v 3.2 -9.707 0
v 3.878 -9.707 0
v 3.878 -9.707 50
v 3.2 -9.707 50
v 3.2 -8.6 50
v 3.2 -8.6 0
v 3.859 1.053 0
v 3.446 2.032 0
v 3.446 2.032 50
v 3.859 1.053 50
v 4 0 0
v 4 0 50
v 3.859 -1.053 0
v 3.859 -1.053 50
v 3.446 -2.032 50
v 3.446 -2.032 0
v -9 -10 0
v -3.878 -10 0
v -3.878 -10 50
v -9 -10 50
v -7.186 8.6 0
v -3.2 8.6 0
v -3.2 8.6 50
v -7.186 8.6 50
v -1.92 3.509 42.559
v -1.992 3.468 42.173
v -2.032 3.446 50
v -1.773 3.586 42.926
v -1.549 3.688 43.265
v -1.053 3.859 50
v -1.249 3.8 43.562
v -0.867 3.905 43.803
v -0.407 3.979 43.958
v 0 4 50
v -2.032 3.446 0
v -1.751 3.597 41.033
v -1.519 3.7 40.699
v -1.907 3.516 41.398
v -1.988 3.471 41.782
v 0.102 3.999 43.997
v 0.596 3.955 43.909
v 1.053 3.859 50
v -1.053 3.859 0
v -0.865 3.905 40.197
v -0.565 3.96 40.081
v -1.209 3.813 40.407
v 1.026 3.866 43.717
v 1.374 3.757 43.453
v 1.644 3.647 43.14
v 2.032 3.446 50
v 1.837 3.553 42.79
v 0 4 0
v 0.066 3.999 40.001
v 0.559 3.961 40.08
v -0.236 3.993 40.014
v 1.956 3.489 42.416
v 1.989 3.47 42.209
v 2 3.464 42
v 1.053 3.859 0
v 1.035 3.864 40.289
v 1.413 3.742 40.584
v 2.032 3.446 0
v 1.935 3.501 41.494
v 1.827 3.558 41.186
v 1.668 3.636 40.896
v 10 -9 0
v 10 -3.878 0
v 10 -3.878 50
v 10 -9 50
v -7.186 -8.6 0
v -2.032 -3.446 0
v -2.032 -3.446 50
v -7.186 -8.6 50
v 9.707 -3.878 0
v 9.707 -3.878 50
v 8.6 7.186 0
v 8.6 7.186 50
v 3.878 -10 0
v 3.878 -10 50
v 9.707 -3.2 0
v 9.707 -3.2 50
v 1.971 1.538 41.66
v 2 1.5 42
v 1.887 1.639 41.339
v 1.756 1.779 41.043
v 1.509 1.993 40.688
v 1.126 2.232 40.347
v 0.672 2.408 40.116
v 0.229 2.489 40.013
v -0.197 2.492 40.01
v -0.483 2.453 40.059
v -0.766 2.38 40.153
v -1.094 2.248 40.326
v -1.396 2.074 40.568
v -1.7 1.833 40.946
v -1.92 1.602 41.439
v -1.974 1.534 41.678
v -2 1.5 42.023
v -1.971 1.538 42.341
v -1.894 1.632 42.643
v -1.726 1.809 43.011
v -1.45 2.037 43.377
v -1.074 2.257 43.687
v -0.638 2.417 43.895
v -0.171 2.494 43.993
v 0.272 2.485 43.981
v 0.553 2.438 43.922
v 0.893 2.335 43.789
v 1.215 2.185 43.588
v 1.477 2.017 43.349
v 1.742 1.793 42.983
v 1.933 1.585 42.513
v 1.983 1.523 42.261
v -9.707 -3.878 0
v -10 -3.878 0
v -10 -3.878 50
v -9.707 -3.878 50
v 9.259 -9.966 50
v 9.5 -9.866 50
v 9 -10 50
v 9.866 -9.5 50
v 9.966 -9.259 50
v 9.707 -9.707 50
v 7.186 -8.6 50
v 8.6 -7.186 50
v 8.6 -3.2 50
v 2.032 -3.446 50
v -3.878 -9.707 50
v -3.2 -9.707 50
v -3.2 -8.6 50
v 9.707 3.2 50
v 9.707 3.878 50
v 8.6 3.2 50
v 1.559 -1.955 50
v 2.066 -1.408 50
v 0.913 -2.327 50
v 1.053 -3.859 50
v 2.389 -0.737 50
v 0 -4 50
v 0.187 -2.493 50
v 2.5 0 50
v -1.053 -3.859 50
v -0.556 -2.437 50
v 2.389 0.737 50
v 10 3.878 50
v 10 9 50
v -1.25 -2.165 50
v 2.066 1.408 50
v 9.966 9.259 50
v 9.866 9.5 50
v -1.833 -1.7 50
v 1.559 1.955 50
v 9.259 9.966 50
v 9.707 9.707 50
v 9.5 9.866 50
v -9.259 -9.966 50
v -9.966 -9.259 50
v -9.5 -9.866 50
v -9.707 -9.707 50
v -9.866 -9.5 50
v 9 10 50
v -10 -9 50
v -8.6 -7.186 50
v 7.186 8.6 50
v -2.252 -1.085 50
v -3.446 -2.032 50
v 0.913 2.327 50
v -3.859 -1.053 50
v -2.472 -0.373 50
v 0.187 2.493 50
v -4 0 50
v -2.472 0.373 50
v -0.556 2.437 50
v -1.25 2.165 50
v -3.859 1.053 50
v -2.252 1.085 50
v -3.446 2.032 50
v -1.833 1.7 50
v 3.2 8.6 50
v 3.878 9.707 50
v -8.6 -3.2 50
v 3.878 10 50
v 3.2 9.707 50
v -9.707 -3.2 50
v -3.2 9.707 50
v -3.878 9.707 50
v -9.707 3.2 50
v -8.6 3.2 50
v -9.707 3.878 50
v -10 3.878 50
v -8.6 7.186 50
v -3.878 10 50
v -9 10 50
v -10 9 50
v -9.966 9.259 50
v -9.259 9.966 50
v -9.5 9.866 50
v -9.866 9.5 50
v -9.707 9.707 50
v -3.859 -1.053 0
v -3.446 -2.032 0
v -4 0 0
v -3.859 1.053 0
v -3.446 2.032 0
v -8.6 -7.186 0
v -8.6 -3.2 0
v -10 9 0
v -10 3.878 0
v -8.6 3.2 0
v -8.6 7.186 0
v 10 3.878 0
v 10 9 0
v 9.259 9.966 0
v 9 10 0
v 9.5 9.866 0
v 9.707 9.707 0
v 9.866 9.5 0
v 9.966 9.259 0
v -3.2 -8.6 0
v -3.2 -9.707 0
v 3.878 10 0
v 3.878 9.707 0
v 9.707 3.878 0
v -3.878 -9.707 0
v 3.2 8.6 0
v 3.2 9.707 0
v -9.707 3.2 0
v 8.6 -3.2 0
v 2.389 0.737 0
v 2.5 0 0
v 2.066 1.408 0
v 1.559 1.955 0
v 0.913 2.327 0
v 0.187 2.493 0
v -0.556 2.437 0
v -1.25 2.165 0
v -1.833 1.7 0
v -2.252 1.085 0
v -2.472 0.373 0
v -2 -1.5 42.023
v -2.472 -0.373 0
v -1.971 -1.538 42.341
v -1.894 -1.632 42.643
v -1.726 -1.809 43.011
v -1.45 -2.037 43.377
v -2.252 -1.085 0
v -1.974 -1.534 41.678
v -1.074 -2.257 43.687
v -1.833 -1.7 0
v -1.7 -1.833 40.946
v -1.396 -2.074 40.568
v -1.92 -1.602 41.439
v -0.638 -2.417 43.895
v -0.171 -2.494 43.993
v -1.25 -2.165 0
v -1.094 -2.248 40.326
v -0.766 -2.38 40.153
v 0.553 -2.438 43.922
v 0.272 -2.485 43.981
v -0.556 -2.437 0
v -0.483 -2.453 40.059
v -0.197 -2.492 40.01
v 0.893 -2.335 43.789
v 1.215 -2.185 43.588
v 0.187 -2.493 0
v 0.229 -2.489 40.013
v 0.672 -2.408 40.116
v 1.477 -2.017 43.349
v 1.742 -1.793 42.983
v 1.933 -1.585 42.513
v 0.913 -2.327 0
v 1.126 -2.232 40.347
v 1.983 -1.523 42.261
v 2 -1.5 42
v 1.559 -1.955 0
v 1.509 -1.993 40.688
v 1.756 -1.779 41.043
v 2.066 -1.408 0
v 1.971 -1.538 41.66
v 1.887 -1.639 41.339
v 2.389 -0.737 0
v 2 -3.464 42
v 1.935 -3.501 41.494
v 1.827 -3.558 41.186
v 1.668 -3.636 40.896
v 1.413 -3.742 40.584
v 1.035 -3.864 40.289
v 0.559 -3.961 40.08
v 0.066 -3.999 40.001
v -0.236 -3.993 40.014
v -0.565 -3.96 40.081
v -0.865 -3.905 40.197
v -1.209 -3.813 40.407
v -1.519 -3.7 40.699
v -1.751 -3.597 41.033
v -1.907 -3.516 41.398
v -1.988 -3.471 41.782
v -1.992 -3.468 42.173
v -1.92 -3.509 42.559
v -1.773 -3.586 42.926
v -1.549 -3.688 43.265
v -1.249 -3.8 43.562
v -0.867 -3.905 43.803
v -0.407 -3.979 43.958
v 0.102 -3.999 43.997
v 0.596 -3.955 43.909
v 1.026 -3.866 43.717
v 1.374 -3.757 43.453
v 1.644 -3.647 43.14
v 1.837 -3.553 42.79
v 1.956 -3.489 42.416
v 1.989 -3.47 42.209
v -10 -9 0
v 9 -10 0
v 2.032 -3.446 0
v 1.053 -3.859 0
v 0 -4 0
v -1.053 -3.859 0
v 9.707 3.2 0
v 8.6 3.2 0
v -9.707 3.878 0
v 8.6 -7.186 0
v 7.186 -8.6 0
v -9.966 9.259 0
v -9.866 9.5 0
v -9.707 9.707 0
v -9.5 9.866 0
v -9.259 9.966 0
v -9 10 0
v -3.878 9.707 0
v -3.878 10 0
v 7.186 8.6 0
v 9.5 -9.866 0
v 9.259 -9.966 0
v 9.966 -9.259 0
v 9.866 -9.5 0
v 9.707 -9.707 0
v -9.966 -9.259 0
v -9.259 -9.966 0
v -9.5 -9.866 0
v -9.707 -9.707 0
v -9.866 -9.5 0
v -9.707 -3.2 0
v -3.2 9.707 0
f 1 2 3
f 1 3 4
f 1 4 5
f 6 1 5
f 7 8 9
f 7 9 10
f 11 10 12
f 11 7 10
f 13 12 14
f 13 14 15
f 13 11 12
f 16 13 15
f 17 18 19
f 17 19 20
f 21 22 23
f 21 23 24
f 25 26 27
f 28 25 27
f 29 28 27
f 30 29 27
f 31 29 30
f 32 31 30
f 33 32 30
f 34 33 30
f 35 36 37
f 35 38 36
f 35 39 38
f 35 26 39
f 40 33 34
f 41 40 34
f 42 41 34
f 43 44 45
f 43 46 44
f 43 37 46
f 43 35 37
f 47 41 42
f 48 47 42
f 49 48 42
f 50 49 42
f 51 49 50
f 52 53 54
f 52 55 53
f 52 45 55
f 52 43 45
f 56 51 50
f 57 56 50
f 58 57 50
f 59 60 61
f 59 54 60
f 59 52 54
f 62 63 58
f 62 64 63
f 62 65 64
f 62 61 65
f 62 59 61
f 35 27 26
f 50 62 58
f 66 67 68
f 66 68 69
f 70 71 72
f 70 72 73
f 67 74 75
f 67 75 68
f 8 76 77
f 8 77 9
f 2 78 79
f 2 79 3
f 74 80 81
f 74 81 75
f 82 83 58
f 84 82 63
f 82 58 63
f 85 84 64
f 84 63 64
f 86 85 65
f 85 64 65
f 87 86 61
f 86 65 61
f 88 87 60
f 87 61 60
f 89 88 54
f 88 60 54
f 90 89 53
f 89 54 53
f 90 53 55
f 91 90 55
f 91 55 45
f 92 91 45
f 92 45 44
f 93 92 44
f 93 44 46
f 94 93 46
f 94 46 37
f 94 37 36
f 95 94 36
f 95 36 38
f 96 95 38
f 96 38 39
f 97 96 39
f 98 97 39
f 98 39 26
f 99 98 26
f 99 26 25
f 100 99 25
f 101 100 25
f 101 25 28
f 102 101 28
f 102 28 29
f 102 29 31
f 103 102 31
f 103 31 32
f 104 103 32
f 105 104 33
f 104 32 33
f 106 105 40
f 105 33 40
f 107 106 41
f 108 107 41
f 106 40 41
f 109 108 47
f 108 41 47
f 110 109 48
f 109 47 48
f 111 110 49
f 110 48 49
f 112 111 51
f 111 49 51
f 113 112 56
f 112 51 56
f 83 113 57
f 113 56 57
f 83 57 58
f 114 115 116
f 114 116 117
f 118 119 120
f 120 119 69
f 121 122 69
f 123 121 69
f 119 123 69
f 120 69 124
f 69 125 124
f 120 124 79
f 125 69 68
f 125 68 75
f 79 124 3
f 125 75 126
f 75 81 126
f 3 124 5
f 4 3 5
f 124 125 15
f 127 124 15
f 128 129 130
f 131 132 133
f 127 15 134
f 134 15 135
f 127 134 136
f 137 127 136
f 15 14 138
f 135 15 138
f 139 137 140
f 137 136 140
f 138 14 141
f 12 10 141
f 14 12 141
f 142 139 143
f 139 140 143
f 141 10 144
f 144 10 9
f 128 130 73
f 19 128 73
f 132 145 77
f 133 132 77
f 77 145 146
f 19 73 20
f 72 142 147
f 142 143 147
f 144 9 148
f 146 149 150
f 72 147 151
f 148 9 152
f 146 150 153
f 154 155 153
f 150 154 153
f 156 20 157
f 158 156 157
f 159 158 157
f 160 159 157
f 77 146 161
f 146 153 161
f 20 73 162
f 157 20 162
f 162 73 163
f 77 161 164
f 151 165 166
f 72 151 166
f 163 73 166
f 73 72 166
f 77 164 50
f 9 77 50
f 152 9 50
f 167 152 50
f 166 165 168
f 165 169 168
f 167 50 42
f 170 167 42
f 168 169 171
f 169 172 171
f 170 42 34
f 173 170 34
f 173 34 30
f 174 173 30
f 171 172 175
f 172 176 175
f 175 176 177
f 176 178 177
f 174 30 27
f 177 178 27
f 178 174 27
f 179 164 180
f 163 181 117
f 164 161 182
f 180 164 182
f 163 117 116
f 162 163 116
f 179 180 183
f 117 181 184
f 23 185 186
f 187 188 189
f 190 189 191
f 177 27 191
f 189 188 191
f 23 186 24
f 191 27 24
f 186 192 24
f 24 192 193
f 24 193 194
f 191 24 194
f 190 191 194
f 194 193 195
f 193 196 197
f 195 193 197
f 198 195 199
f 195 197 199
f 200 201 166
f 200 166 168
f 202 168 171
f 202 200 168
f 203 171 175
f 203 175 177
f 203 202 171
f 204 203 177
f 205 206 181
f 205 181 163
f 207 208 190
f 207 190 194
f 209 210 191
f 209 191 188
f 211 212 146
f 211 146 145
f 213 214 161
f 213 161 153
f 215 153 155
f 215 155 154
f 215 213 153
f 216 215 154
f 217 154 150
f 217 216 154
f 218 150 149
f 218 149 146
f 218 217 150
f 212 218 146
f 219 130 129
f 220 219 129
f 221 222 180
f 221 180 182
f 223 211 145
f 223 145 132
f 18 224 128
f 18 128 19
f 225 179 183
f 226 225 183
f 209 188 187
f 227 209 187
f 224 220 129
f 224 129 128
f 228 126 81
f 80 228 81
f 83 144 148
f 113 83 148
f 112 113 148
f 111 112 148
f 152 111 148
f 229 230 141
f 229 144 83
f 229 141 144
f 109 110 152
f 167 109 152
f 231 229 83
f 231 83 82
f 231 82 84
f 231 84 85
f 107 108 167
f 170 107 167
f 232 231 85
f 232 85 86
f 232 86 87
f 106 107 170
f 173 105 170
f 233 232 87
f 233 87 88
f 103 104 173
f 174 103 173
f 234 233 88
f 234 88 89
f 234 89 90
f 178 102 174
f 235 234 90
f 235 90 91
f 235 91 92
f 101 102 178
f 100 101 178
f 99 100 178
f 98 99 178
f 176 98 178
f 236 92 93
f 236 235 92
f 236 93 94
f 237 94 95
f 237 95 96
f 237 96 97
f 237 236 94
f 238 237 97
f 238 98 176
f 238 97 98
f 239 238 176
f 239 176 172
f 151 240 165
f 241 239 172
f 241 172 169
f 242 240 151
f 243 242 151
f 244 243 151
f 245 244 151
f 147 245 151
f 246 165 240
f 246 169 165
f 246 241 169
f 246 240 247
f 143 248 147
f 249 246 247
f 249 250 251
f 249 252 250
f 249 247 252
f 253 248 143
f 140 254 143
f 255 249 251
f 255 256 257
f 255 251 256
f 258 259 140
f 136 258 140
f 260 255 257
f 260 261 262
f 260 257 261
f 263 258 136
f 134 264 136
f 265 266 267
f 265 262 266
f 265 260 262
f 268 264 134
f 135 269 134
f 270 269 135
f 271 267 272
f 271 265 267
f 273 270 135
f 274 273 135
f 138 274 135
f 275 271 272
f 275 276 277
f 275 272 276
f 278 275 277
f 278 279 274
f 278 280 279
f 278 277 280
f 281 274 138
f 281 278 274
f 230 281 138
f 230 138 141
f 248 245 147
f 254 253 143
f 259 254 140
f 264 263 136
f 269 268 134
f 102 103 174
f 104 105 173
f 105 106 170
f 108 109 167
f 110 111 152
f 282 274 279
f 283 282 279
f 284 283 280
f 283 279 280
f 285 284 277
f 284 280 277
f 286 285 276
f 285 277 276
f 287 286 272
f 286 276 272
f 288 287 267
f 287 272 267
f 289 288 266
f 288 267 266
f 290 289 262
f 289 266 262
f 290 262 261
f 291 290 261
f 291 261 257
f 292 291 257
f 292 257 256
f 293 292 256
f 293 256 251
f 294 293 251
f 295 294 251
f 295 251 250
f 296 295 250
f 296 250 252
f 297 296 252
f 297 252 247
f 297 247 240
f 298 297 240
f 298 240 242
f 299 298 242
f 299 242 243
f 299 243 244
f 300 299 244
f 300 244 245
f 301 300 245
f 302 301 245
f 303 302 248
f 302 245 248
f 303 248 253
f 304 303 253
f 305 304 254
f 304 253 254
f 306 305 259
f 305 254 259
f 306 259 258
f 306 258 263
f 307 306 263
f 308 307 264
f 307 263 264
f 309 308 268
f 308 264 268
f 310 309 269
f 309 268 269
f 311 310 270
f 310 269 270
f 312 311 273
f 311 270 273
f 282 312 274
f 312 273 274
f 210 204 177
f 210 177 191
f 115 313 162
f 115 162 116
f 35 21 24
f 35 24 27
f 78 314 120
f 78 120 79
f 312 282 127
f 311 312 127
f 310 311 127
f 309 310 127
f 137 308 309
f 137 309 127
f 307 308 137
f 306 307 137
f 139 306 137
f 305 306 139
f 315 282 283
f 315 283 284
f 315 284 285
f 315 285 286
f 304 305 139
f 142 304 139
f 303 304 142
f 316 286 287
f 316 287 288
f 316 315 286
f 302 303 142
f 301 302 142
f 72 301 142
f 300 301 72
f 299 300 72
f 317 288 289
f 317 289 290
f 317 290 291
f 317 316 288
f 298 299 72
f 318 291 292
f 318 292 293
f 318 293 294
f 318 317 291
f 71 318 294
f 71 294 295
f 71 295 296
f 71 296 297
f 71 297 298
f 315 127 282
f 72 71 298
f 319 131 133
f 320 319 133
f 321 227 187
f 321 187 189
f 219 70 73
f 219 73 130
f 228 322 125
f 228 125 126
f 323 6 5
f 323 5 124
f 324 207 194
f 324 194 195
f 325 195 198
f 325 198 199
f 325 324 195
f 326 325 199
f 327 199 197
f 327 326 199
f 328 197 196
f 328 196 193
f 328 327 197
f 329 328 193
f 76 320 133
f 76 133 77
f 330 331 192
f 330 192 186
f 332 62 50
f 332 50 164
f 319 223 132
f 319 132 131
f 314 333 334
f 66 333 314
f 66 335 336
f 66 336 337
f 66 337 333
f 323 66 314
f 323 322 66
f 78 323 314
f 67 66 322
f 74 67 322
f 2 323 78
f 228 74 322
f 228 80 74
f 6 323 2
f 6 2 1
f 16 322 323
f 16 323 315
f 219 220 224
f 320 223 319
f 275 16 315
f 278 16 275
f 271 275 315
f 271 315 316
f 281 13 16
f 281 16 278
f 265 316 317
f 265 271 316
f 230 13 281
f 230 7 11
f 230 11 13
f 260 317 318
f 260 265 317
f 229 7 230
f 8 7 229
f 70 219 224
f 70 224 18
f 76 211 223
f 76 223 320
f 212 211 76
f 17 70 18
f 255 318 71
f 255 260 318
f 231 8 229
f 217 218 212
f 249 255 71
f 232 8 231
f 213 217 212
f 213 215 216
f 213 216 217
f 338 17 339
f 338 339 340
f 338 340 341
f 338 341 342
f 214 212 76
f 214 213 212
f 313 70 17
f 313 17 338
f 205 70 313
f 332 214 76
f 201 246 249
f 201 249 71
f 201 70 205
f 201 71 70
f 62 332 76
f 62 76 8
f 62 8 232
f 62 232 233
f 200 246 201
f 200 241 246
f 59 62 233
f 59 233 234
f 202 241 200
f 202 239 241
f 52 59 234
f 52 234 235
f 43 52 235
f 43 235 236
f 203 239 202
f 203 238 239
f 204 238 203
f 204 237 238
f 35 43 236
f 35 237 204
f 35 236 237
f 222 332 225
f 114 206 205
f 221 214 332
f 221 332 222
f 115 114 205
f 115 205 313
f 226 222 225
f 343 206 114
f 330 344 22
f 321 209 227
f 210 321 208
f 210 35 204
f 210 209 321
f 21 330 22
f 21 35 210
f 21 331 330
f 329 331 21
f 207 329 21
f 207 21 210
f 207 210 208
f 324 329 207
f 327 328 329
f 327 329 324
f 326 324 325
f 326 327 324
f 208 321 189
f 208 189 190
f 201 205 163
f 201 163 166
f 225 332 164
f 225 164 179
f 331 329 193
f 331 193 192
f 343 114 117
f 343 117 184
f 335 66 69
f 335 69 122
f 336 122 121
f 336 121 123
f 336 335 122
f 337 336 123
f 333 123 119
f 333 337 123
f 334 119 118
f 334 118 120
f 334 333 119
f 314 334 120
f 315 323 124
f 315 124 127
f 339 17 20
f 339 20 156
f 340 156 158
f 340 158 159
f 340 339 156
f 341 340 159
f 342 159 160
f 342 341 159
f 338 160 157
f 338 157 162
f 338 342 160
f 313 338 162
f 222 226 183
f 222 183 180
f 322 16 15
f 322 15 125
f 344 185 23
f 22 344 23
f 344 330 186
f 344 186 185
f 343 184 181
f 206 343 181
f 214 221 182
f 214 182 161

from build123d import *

# Parameters (mm, degrees)
SKETCH1_R               = 2.5
BOSS_EXTRUDE1_DEPTH     = 50
SKETCH2_R               = 2
CUT_EXTRUDE1_DEPTH      = 1
CUT_EXTRUDE1_DEPTH_BACK = 21


with BuildPart() as part:
    # Sketch1 → Boss-Extrude1 (new body)
    with BuildSketch(Plane.XY):
        with BuildLine():
            Line((-9.707106781, -3.2), (-8.6, -3.2))
            Line((-8.6, -3.2), (-8.6, -7.185786438))
            Line((-8.6, -7.185786438), (-3.445719569, -2.031506006))
            ThreePointArc((-3.445719569, -2.031506006), (-4, 0), (-3.445719569, 2.031506006))
            Line((-3.445719569, 2.031506006), (-8.6, 7.185786438))
            Line((-8.6, 7.185786438), (-8.6, 3.2))
            Line((-8.6, 3.2), (-9.707106781, 3.2))
            Line((-9.707106781, 3.2), (-9.707106781, 3.877544562))
            Line((-9.707106781, 3.877544562), (-10, 3.877544562))
            Line((-10, 3.877544562), (-10, 9))
            ThreePointArc((-10, 9), (-9.707106781, 9.707106781), (-9, 10))
            Line((-9, 10), (-3.877544562, 10))
            Line((-3.877544562, 10), (-3.877544562, 9.707106781))
            Line((-3.877544562, 9.707106781), (-3.2, 9.707106781))
            Line((-3.2, 9.707106781), (-3.2, 8.6))
            Line((-3.2, 8.6), (-7.185786438, 8.6))
            Line((-7.185786438, 8.6), (-2.031506006, 3.445719569))
            ThreePointArc((-2.031506006, 3.445719569), (0, 4), (2.031506006, 3.445719569))
            Line((2.031506006, 3.445719569), (7.185786438, 8.6))
            Line((7.185786438, 8.6), (3.2, 8.6))
            Line((3.2, 8.6), (3.2, 9.707106781))
            Line((3.2, 9.707106781), (3.877544562, 9.707106781))
            Line((3.877544562, 9.707106781), (3.877544562, 10))
            Line((3.877544562, 10), (9, 10))
            ThreePointArc((9, 10), (9.707106781, 9.707106781), (10, 9))
            Line((10, 9), (10, 3.877544562))
            Line((10, 3.877544562), (9.707106781, 3.877544562))
            Line((9.707106781, 3.877544562), (9.707106781, 3.2))
            Line((9.707106781, 3.2), (8.6, 3.2))
            Line((8.6, 3.2), (8.6, 7.185786438))
            Line((8.6, 7.185786438), (3.445719569, 2.031506006))
            ThreePointArc((3.445719569, 2.031506006), (4, 0), (3.445719569, -2.031506006))
            Line((3.445719569, -2.031506006), (8.6, -7.185786438))
            Line((8.6, -7.185786438), (8.6, -3.2))
            Line((8.6, -3.2), (9.707106781, -3.2))
            Line((9.707106781, -3.2), (9.707106781, -3.877544562))
            Line((9.707106781, -3.877544562), (10, -3.877544562))
            Line((10, -3.877544562), (10, -9))
            ThreePointArc((10, -9), (9.707106781, -9.707106781), (9, -10))
            Line((9, -10), (3.877544562, -10))
            Line((3.877544562, -10), (3.877544562, -9.707106781))
            Line((3.877544562, -9.707106781), (3.2, -9.707106781))
            Line((3.2, -9.707106781), (3.2, -8.6))
            Line((3.2, -8.6), (7.185786438, -8.6))
            Line((7.185786438, -8.6), (2.031506006, -3.445719569))
            ThreePointArc((2.031506006, -3.445719569), (0, -4), (-2.031506006, -3.445719569))
            Line((-2.031506006, -3.445719569), (-7.185786438, -8.6))
            Line((-7.185786438, -8.6), (-3.2, -8.6))
            Line((-3.2, -8.6), (-3.2, -9.707106781))
            Line((-3.2, -9.707106781), (-3.877544562, -9.707106781))
            Line((-3.877544562, -9.707106781), (-3.877544562, -10))
            Line((-3.877544562, -10), (-9, -10))
            ThreePointArc((-9, -10), (-9.707106781, -9.707106781), (-10, -9))
            Line((-10, -9), (-10, -3.877544562))
            Line((-10, -3.877544562), (-9.707106781, -3.877544562))
            Line((-9.707106781, -3.877544562), (-9.707106781, -3.2))
        make_face()
        Circle(SKETCH1_R, mode=Mode.SUBTRACT)
    extrude(amount=BOSS_EXTRUDE1_DEPTH)

    # Sketch2 → Cut-Extrude1 (cut, two sides)
    with BuildSketch(Plane(origin=(0, 10, 0), x_dir=(1, 0, 0), z_dir=(0, 1, 0))) as cut_extrude1_sk:
        with Locations((0, -42)):
            Circle(SKETCH2_R)
    extrude(amount=CUT_EXTRUDE1_DEPTH, mode=Mode.SUBTRACT)
    extrude(cut_extrude1_sk.sketch, amount=-CUT_EXTRUDE1_DEPTH_BACK, mode=Mode.SUBTRACT)


solid = part.part
